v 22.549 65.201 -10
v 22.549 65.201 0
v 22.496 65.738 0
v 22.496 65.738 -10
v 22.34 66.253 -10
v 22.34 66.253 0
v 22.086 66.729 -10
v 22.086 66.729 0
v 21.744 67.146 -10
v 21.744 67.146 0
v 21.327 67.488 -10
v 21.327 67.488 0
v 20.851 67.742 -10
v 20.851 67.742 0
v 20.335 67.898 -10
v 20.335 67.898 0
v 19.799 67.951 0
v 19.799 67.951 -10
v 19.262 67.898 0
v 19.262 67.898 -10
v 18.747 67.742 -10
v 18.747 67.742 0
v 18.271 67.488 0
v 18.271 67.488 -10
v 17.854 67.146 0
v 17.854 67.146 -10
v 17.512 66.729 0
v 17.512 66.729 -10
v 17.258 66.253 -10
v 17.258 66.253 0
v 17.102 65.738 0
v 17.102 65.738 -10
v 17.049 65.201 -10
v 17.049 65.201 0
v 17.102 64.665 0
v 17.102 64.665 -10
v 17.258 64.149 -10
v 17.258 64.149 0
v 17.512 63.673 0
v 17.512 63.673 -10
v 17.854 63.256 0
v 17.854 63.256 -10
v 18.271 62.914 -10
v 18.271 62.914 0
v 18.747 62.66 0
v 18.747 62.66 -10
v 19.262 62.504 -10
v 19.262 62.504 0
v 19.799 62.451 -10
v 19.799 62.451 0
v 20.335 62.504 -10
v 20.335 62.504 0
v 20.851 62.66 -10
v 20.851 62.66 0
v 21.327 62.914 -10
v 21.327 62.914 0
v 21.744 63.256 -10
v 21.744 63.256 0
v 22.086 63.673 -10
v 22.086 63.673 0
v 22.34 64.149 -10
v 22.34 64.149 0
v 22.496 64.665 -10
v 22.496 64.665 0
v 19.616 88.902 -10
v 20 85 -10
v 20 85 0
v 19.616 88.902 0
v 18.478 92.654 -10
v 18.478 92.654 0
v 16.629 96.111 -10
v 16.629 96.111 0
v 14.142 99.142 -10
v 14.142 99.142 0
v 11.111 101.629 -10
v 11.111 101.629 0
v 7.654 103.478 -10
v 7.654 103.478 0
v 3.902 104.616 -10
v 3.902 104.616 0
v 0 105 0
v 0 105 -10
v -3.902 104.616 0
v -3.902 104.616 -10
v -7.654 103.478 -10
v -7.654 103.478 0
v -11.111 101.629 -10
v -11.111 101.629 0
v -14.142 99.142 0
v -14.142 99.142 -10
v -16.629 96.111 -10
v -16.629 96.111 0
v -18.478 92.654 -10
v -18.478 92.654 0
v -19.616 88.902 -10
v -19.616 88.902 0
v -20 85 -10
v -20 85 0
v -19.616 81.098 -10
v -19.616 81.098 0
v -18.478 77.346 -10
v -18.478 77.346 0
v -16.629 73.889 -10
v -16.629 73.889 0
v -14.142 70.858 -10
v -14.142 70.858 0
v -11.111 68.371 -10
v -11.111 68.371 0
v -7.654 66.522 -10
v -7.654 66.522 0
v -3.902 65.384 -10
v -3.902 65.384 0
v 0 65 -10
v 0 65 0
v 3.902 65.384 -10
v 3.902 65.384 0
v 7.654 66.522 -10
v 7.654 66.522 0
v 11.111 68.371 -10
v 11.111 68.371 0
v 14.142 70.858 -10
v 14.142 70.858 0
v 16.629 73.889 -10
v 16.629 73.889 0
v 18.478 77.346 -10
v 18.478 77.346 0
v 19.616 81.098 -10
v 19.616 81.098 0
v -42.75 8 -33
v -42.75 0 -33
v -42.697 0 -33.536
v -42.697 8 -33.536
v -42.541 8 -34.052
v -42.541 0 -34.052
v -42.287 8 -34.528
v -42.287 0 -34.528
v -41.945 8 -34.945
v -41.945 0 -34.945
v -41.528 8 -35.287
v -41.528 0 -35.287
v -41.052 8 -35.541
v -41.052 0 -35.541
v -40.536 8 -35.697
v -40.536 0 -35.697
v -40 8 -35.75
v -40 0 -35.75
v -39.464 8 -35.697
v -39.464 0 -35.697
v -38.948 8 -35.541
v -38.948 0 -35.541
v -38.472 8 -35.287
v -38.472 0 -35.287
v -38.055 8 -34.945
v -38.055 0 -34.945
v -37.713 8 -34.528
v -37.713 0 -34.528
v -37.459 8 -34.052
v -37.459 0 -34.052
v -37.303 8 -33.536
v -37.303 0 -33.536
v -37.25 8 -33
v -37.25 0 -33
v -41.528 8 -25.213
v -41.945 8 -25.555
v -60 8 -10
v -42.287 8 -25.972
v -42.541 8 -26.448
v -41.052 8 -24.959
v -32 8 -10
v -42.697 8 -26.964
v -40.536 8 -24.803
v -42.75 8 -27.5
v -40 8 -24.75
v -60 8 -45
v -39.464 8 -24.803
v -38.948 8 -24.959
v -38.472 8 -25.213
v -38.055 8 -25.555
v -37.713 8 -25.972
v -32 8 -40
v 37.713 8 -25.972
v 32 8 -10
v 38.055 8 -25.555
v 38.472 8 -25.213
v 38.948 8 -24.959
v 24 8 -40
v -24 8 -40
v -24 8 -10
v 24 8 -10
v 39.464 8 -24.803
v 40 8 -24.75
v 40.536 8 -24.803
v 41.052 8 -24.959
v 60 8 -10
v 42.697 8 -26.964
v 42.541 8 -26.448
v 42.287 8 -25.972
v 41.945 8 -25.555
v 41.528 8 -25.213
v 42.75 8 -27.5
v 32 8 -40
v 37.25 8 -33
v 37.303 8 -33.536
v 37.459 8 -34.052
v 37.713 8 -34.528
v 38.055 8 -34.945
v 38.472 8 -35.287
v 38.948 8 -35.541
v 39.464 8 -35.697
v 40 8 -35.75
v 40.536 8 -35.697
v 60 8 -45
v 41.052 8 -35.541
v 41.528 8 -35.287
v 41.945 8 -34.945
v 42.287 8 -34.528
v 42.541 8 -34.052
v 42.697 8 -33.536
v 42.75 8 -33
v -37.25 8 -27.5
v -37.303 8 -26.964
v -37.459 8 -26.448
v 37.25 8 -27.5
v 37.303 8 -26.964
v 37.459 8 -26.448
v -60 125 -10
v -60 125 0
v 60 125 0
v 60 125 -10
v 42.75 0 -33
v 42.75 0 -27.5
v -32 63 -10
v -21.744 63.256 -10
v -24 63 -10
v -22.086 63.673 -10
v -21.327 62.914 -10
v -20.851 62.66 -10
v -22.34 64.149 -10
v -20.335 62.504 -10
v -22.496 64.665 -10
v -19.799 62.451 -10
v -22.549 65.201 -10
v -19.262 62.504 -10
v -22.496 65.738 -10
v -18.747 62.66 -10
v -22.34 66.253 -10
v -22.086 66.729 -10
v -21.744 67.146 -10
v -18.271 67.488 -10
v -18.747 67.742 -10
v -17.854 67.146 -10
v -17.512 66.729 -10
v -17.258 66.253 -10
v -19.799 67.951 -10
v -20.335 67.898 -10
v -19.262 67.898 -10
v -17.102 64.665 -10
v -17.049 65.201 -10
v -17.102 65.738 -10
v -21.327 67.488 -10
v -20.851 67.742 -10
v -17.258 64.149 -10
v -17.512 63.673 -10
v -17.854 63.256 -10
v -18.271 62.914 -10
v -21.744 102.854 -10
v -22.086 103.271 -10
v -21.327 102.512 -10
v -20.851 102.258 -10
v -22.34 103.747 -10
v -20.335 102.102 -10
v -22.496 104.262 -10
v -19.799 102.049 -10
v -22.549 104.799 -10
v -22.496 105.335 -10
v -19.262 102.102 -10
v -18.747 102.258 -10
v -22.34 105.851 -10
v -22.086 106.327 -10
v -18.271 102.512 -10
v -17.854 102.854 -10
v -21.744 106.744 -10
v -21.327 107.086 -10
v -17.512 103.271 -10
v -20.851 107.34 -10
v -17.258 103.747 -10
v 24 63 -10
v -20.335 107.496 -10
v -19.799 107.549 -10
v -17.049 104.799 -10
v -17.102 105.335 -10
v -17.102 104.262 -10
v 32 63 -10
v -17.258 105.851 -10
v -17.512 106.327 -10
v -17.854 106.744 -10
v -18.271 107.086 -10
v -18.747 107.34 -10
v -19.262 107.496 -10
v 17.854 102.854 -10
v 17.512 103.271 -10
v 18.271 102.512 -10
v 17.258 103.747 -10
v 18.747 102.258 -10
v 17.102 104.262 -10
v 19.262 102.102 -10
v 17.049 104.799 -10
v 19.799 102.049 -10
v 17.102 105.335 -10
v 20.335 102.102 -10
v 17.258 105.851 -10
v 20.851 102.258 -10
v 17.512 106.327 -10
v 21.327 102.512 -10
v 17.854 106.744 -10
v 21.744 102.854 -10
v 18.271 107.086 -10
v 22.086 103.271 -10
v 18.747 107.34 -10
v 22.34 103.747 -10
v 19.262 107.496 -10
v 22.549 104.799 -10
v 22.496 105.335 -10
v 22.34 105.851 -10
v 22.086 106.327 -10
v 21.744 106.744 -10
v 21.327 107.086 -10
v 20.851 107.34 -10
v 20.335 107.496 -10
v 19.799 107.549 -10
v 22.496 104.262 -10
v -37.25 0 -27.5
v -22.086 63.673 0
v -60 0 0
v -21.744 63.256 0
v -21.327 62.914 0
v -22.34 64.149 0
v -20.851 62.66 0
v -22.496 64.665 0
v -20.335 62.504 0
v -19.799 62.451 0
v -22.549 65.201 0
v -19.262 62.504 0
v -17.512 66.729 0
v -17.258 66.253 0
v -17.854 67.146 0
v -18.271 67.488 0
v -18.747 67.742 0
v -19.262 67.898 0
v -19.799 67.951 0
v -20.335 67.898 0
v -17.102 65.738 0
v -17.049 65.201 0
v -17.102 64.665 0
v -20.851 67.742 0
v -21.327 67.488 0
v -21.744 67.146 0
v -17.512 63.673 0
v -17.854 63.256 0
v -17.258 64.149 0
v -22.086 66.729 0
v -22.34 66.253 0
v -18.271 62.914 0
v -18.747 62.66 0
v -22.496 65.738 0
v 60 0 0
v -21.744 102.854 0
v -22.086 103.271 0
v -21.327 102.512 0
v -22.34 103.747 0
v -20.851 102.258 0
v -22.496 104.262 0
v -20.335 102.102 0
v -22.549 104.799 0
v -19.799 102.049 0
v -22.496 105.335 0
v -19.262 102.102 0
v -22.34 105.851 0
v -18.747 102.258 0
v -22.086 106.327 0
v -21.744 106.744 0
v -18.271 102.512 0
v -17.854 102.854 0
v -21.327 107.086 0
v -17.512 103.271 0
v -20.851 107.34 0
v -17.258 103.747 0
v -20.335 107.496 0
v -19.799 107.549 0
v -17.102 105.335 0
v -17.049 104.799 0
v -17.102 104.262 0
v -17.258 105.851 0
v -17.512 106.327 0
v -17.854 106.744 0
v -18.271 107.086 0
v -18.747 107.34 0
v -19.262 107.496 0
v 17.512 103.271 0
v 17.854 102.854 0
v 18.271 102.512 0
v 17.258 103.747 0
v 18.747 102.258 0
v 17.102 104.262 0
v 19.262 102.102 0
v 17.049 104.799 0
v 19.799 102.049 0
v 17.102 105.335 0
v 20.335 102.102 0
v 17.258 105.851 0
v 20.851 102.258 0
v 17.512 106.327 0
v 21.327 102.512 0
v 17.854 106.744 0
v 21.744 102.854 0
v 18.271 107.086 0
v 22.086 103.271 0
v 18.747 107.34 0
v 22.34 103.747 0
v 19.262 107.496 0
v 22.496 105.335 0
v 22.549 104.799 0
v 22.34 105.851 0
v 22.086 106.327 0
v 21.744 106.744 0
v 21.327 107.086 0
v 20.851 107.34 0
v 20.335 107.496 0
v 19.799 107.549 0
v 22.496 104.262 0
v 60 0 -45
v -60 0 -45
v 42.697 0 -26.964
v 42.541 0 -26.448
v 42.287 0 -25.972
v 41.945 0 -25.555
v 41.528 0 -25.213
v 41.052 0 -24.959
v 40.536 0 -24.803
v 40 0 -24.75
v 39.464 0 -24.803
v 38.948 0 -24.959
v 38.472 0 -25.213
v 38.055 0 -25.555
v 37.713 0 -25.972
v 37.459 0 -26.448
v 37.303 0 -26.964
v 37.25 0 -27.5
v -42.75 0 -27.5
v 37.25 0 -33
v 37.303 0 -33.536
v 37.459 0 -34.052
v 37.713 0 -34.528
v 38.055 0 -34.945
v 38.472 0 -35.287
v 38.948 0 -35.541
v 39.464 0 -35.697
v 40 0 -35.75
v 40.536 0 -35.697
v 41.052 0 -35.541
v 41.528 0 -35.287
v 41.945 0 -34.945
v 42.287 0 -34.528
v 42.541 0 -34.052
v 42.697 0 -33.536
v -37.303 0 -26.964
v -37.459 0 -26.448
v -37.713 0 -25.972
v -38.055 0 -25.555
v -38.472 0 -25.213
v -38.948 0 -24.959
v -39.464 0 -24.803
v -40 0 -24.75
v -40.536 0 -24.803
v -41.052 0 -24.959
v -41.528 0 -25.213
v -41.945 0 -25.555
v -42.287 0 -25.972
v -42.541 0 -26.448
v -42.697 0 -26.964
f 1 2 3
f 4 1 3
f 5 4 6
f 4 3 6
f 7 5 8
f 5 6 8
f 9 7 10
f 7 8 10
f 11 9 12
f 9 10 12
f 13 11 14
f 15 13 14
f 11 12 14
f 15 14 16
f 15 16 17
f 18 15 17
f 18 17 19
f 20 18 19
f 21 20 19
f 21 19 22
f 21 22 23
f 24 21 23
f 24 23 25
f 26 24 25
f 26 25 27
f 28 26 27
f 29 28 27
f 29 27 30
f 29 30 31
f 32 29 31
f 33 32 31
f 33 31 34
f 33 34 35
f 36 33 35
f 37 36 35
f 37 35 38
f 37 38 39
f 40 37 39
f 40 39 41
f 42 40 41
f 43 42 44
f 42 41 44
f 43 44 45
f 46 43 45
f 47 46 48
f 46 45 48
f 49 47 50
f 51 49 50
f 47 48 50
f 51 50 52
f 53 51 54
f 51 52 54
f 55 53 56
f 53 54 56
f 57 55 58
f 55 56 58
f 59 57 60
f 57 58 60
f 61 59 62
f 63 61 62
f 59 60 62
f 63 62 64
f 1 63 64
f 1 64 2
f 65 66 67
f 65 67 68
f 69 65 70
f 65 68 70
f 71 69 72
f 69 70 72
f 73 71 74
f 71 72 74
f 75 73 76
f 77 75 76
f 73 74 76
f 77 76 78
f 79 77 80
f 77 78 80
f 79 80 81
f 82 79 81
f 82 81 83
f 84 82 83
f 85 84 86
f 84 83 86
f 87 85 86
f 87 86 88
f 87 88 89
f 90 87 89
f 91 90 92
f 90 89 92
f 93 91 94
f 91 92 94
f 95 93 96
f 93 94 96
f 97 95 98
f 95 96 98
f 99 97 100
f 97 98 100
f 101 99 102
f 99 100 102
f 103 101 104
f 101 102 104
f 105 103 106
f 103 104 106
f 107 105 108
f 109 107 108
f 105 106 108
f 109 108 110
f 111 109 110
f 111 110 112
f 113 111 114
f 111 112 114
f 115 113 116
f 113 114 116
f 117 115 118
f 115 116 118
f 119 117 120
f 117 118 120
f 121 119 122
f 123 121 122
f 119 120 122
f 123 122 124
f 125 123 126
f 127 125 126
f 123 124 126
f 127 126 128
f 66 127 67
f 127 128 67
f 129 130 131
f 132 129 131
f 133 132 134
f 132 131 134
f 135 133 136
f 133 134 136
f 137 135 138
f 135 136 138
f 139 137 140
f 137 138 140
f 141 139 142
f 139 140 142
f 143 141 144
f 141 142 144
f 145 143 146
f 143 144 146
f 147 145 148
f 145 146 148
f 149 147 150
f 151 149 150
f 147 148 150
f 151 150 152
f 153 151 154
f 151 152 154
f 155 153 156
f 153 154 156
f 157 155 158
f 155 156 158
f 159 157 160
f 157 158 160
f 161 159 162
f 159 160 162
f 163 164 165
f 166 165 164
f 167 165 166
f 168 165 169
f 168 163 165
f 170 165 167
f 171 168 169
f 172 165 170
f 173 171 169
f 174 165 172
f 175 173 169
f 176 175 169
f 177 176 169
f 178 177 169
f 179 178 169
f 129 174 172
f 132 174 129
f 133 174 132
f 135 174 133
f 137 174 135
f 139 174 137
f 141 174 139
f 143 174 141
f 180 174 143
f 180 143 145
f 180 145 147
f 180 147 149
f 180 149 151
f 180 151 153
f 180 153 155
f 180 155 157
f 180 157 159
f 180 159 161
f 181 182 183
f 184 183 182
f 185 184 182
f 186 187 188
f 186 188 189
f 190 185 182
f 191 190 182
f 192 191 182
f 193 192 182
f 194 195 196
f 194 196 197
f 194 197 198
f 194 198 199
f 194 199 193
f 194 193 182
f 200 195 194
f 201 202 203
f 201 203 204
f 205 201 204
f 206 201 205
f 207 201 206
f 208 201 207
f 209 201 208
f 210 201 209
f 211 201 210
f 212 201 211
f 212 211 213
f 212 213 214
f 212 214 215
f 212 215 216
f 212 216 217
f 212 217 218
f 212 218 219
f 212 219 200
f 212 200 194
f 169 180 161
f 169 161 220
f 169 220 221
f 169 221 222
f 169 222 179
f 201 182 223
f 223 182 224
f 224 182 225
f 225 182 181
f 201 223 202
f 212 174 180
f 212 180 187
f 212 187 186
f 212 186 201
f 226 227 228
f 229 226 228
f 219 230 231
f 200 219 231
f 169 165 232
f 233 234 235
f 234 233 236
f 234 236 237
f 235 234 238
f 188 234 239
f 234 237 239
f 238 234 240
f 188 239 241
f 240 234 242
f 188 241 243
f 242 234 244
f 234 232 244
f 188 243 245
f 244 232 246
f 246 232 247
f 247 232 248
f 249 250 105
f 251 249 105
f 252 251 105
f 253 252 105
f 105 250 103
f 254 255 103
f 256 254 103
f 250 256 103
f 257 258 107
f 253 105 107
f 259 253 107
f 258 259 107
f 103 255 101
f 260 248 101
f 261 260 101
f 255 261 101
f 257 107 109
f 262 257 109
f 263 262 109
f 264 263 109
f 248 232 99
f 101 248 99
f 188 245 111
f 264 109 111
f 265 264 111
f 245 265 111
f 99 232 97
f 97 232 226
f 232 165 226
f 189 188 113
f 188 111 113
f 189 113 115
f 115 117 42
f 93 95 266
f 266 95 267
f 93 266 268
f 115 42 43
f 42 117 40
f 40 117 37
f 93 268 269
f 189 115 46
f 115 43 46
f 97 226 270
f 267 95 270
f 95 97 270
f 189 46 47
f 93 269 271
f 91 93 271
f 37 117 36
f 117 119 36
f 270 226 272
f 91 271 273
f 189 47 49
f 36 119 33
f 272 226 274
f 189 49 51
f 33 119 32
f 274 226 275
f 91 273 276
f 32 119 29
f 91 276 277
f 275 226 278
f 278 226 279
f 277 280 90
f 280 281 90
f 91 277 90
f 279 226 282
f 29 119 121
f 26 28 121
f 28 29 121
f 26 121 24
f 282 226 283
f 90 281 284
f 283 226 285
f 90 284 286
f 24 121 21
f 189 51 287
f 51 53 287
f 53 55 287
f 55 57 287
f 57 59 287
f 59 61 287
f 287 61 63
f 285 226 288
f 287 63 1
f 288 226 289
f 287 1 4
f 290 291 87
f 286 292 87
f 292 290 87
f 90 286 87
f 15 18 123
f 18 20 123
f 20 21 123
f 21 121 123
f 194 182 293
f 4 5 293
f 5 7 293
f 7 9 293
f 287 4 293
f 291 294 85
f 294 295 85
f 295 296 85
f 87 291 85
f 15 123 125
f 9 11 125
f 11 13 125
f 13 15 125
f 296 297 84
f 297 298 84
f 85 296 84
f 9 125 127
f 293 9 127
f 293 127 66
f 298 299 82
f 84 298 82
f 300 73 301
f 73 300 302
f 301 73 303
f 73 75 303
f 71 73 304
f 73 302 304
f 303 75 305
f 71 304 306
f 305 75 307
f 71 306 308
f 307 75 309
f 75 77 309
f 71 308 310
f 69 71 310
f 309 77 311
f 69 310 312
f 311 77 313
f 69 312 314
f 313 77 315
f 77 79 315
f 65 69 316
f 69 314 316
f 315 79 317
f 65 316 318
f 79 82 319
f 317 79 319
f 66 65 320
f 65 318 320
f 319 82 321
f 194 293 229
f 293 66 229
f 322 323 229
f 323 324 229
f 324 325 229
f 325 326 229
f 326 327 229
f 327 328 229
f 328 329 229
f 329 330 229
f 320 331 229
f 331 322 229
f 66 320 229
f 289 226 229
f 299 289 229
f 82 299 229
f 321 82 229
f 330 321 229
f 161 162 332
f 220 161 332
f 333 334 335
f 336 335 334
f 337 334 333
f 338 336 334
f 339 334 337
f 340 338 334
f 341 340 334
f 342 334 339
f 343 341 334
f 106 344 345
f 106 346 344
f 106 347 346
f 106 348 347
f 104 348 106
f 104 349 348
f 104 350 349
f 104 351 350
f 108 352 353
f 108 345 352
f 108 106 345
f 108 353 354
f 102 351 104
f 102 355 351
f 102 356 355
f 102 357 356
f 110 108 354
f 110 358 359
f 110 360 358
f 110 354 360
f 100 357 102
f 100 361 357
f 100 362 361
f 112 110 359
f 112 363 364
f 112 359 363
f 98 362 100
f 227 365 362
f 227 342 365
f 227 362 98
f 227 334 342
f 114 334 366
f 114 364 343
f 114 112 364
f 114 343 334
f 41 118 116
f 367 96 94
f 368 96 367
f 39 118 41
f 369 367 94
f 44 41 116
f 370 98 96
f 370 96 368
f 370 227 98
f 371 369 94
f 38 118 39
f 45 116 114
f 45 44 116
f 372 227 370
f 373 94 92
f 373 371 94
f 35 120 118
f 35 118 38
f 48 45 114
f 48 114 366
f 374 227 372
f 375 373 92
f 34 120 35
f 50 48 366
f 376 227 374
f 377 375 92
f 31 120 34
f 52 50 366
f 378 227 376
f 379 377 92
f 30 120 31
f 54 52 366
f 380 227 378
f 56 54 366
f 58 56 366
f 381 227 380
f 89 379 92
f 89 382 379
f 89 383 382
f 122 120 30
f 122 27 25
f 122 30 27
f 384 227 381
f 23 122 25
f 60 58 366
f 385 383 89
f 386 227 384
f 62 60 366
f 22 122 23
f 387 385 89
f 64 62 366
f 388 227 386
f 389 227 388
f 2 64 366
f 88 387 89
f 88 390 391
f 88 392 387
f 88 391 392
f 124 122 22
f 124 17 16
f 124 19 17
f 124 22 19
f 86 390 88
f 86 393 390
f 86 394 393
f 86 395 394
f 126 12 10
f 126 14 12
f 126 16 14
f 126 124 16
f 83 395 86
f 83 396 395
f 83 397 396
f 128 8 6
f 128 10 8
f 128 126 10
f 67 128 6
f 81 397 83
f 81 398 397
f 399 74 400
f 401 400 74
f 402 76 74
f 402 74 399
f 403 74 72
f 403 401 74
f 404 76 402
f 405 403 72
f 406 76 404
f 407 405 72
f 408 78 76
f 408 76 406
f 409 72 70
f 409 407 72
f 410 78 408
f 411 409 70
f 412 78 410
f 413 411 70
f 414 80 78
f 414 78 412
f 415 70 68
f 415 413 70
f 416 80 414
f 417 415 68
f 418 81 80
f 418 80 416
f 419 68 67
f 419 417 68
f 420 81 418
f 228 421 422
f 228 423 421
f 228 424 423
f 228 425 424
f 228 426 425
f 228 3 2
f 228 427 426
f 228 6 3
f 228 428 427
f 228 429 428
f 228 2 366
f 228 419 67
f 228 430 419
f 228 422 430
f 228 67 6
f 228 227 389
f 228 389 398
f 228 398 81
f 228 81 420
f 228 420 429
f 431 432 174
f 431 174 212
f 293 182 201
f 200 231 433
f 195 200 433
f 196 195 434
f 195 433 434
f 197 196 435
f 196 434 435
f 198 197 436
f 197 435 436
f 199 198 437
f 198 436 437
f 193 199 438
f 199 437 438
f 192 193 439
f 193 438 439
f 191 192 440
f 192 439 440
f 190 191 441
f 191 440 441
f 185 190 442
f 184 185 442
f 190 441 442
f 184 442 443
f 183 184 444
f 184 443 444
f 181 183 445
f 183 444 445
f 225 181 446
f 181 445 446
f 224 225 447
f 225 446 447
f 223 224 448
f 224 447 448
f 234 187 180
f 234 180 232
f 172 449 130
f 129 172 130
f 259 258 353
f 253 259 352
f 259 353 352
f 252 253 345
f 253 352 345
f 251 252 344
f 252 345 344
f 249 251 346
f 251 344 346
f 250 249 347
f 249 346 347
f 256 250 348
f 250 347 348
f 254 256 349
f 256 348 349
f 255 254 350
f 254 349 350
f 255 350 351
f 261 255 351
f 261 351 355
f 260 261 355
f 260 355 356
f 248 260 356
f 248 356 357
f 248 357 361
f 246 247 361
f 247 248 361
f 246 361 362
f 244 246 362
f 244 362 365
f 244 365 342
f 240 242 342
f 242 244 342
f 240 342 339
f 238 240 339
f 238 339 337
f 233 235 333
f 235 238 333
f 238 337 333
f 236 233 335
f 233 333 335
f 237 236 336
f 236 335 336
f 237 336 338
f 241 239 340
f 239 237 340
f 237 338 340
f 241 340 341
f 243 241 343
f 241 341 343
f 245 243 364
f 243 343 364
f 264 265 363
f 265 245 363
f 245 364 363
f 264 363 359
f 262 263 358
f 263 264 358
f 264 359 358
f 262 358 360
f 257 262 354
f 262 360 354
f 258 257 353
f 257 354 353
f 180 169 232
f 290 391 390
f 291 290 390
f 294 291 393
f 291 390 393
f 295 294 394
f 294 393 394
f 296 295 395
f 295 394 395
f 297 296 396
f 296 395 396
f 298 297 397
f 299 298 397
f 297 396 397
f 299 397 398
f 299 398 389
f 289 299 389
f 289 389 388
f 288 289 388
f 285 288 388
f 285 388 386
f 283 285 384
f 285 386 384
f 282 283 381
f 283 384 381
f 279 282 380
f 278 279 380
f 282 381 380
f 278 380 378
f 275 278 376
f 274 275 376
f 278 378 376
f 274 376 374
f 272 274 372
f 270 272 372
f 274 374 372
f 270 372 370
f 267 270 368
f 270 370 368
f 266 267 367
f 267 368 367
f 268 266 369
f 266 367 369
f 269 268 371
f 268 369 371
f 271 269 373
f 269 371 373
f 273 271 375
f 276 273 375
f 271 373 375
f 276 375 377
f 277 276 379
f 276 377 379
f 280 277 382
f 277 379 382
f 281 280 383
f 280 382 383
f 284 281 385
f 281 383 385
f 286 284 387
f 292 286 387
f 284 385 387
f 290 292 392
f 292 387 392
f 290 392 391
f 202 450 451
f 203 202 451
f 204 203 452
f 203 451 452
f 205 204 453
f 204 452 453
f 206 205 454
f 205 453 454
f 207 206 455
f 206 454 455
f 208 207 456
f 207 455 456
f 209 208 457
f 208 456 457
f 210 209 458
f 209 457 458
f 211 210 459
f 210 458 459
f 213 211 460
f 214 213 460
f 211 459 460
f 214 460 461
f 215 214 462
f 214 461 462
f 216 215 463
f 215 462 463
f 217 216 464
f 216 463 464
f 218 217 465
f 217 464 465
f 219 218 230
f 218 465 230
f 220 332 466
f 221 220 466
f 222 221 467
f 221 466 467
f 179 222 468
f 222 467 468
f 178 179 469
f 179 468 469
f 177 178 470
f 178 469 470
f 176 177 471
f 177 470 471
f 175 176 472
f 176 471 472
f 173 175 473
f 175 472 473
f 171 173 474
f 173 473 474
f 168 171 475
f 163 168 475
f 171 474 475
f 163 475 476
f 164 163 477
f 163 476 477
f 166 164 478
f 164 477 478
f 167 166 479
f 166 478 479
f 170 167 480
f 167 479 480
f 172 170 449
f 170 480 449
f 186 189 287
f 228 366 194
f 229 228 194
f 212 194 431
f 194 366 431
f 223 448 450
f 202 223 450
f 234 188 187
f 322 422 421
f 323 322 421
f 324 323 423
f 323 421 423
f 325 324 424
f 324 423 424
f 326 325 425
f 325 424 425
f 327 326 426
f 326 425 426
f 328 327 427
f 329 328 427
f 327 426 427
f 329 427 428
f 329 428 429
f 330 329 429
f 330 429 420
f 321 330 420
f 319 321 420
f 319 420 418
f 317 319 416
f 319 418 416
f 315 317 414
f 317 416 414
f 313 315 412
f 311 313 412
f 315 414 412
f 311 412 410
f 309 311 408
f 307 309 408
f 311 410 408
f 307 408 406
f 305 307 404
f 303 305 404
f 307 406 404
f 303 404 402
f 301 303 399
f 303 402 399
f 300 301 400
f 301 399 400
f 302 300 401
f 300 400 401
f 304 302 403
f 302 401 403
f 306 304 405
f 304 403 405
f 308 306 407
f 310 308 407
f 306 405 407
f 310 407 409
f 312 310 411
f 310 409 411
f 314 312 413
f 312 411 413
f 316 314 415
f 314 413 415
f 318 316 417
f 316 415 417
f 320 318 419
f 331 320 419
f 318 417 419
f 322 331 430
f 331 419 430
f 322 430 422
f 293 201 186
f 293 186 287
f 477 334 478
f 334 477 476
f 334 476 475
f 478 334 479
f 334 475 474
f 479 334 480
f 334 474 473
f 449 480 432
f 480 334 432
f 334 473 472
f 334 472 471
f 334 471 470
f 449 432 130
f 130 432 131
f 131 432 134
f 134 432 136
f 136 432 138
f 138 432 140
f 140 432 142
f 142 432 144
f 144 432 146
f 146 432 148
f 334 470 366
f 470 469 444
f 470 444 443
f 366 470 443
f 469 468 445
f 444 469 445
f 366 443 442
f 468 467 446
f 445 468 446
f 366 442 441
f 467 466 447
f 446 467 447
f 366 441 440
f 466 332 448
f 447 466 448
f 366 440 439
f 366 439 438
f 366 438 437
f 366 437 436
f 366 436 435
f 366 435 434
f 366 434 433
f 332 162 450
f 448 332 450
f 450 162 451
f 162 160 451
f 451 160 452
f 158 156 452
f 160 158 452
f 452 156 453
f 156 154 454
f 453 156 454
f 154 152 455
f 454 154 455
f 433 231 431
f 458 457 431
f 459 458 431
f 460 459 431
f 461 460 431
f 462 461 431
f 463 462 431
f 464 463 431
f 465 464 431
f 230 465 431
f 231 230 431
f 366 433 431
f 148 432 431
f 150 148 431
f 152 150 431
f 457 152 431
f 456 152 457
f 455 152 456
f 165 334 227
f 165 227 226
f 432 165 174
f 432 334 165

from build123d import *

# Parameters (mm, degrees)
SKETCH_1_W          = 120
SKETCH_1_H          = 125
SKETCH_1_R          = 20
SKETCH_1_R_2        = 2.75
EXTRUDE_1_DEPTH     = 10
SKETCH_2_W          = 120
SKETCH_2_H          = 35
EXTRUDE_3_DEPTH     = 8
EXTRUDE_4_DEPTH     = 32
CUT_EXTRUDE_1_DEPTH = 24


with BuildPart() as part:
    # 草图1 → 凸台-拉伸1 (new body)
    with BuildSketch(Plane.XY):
        with Locations((0, 62.5)):
            Rectangle(SKETCH_1_W, SKETCH_1_H)
        with Locations((0, 85)):
            Circle(SKETCH_1_R, mode=Mode.SUBTRACT)
        with Locations((19.798989873, 104.798989873)):
            Circle(SKETCH_1_R_2, mode=Mode.SUBTRACT)
        with Locations((-19.798989873, 104.798989873)):
            Circle(SKETCH_1_R_2, mode=Mode.SUBTRACT)
        with Locations((-19.798989873, 65.201010127)):
            Circle(SKETCH_1_R_2, mode=Mode.SUBTRACT)
        with Locations((19.798989873, 65.201010127)):
            Circle(SKETCH_1_R_2, mode=Mode.SUBTRACT)
    extrude(amount=-EXTRUDE_1_DEPTH)

    # 草图2 → 凸台-拉伸3 (add)
    with BuildSketch(Plane(origin=(0, 0, 0), x_dir=(1, 0, 0), z_dir=(0, 1, 0))):
        with Locations((0, 27.5)):
            Rectangle(SKETCH_2_W, SKETCH_2_H)
        with BuildLine():
            Line((-42.75, 27.5), (-42.75, 33))
            ThreePointArc((-42.75, 33), (-40, 35.75), (-37.25, 33))
            Line((-37.25, 33), (-37.25, 27.5))
            ThreePointArc((-37.25, 27.5), (-40, 24.75), (-42.75, 27.5))
        make_face(mode=Mode.SUBTRACT)
        with BuildLine():
            Line((37.25, 27.5), (37.25, 33))
            ThreePointArc((37.25, 33), (40, 35.75), (42.75, 33))
            Line((42.75, 33), (42.75, 27.5))
            ThreePointArc((42.75, 27.5), (40, 24.75), (37.25, 27.5))
        make_face(mode=Mode.SUBTRACT)
    extrude(amount=EXTRUDE_3_DEPTH)

    # 草图3 → 凸台-拉伸4 (add, symmetric)
    with BuildSketch(Plane(origin=(0, 0, 0), x_dir=(0, 0, -1), z_dir=(1, 0, 0))):
        Polygon((10, 8), (40, 8), (10, 63), align=None)
    extrude(amount=EXTRUDE_4_DEPTH, both=True)

    # 草图4 → 切除-拉伸1 (cut, symmetric)
    with BuildSketch(Plane(origin=(0, 0, 0), x_dir=(0, 0, -1), z_dir=(1, 0, 0))):
        Polygon((10, 8), (40, 8), (10, 63), align=None)
    extrude(amount=CUT_EXTRUDE_1_DEPTH, both=True, mode=Mode.SUBTRACT)


solid = part.part
